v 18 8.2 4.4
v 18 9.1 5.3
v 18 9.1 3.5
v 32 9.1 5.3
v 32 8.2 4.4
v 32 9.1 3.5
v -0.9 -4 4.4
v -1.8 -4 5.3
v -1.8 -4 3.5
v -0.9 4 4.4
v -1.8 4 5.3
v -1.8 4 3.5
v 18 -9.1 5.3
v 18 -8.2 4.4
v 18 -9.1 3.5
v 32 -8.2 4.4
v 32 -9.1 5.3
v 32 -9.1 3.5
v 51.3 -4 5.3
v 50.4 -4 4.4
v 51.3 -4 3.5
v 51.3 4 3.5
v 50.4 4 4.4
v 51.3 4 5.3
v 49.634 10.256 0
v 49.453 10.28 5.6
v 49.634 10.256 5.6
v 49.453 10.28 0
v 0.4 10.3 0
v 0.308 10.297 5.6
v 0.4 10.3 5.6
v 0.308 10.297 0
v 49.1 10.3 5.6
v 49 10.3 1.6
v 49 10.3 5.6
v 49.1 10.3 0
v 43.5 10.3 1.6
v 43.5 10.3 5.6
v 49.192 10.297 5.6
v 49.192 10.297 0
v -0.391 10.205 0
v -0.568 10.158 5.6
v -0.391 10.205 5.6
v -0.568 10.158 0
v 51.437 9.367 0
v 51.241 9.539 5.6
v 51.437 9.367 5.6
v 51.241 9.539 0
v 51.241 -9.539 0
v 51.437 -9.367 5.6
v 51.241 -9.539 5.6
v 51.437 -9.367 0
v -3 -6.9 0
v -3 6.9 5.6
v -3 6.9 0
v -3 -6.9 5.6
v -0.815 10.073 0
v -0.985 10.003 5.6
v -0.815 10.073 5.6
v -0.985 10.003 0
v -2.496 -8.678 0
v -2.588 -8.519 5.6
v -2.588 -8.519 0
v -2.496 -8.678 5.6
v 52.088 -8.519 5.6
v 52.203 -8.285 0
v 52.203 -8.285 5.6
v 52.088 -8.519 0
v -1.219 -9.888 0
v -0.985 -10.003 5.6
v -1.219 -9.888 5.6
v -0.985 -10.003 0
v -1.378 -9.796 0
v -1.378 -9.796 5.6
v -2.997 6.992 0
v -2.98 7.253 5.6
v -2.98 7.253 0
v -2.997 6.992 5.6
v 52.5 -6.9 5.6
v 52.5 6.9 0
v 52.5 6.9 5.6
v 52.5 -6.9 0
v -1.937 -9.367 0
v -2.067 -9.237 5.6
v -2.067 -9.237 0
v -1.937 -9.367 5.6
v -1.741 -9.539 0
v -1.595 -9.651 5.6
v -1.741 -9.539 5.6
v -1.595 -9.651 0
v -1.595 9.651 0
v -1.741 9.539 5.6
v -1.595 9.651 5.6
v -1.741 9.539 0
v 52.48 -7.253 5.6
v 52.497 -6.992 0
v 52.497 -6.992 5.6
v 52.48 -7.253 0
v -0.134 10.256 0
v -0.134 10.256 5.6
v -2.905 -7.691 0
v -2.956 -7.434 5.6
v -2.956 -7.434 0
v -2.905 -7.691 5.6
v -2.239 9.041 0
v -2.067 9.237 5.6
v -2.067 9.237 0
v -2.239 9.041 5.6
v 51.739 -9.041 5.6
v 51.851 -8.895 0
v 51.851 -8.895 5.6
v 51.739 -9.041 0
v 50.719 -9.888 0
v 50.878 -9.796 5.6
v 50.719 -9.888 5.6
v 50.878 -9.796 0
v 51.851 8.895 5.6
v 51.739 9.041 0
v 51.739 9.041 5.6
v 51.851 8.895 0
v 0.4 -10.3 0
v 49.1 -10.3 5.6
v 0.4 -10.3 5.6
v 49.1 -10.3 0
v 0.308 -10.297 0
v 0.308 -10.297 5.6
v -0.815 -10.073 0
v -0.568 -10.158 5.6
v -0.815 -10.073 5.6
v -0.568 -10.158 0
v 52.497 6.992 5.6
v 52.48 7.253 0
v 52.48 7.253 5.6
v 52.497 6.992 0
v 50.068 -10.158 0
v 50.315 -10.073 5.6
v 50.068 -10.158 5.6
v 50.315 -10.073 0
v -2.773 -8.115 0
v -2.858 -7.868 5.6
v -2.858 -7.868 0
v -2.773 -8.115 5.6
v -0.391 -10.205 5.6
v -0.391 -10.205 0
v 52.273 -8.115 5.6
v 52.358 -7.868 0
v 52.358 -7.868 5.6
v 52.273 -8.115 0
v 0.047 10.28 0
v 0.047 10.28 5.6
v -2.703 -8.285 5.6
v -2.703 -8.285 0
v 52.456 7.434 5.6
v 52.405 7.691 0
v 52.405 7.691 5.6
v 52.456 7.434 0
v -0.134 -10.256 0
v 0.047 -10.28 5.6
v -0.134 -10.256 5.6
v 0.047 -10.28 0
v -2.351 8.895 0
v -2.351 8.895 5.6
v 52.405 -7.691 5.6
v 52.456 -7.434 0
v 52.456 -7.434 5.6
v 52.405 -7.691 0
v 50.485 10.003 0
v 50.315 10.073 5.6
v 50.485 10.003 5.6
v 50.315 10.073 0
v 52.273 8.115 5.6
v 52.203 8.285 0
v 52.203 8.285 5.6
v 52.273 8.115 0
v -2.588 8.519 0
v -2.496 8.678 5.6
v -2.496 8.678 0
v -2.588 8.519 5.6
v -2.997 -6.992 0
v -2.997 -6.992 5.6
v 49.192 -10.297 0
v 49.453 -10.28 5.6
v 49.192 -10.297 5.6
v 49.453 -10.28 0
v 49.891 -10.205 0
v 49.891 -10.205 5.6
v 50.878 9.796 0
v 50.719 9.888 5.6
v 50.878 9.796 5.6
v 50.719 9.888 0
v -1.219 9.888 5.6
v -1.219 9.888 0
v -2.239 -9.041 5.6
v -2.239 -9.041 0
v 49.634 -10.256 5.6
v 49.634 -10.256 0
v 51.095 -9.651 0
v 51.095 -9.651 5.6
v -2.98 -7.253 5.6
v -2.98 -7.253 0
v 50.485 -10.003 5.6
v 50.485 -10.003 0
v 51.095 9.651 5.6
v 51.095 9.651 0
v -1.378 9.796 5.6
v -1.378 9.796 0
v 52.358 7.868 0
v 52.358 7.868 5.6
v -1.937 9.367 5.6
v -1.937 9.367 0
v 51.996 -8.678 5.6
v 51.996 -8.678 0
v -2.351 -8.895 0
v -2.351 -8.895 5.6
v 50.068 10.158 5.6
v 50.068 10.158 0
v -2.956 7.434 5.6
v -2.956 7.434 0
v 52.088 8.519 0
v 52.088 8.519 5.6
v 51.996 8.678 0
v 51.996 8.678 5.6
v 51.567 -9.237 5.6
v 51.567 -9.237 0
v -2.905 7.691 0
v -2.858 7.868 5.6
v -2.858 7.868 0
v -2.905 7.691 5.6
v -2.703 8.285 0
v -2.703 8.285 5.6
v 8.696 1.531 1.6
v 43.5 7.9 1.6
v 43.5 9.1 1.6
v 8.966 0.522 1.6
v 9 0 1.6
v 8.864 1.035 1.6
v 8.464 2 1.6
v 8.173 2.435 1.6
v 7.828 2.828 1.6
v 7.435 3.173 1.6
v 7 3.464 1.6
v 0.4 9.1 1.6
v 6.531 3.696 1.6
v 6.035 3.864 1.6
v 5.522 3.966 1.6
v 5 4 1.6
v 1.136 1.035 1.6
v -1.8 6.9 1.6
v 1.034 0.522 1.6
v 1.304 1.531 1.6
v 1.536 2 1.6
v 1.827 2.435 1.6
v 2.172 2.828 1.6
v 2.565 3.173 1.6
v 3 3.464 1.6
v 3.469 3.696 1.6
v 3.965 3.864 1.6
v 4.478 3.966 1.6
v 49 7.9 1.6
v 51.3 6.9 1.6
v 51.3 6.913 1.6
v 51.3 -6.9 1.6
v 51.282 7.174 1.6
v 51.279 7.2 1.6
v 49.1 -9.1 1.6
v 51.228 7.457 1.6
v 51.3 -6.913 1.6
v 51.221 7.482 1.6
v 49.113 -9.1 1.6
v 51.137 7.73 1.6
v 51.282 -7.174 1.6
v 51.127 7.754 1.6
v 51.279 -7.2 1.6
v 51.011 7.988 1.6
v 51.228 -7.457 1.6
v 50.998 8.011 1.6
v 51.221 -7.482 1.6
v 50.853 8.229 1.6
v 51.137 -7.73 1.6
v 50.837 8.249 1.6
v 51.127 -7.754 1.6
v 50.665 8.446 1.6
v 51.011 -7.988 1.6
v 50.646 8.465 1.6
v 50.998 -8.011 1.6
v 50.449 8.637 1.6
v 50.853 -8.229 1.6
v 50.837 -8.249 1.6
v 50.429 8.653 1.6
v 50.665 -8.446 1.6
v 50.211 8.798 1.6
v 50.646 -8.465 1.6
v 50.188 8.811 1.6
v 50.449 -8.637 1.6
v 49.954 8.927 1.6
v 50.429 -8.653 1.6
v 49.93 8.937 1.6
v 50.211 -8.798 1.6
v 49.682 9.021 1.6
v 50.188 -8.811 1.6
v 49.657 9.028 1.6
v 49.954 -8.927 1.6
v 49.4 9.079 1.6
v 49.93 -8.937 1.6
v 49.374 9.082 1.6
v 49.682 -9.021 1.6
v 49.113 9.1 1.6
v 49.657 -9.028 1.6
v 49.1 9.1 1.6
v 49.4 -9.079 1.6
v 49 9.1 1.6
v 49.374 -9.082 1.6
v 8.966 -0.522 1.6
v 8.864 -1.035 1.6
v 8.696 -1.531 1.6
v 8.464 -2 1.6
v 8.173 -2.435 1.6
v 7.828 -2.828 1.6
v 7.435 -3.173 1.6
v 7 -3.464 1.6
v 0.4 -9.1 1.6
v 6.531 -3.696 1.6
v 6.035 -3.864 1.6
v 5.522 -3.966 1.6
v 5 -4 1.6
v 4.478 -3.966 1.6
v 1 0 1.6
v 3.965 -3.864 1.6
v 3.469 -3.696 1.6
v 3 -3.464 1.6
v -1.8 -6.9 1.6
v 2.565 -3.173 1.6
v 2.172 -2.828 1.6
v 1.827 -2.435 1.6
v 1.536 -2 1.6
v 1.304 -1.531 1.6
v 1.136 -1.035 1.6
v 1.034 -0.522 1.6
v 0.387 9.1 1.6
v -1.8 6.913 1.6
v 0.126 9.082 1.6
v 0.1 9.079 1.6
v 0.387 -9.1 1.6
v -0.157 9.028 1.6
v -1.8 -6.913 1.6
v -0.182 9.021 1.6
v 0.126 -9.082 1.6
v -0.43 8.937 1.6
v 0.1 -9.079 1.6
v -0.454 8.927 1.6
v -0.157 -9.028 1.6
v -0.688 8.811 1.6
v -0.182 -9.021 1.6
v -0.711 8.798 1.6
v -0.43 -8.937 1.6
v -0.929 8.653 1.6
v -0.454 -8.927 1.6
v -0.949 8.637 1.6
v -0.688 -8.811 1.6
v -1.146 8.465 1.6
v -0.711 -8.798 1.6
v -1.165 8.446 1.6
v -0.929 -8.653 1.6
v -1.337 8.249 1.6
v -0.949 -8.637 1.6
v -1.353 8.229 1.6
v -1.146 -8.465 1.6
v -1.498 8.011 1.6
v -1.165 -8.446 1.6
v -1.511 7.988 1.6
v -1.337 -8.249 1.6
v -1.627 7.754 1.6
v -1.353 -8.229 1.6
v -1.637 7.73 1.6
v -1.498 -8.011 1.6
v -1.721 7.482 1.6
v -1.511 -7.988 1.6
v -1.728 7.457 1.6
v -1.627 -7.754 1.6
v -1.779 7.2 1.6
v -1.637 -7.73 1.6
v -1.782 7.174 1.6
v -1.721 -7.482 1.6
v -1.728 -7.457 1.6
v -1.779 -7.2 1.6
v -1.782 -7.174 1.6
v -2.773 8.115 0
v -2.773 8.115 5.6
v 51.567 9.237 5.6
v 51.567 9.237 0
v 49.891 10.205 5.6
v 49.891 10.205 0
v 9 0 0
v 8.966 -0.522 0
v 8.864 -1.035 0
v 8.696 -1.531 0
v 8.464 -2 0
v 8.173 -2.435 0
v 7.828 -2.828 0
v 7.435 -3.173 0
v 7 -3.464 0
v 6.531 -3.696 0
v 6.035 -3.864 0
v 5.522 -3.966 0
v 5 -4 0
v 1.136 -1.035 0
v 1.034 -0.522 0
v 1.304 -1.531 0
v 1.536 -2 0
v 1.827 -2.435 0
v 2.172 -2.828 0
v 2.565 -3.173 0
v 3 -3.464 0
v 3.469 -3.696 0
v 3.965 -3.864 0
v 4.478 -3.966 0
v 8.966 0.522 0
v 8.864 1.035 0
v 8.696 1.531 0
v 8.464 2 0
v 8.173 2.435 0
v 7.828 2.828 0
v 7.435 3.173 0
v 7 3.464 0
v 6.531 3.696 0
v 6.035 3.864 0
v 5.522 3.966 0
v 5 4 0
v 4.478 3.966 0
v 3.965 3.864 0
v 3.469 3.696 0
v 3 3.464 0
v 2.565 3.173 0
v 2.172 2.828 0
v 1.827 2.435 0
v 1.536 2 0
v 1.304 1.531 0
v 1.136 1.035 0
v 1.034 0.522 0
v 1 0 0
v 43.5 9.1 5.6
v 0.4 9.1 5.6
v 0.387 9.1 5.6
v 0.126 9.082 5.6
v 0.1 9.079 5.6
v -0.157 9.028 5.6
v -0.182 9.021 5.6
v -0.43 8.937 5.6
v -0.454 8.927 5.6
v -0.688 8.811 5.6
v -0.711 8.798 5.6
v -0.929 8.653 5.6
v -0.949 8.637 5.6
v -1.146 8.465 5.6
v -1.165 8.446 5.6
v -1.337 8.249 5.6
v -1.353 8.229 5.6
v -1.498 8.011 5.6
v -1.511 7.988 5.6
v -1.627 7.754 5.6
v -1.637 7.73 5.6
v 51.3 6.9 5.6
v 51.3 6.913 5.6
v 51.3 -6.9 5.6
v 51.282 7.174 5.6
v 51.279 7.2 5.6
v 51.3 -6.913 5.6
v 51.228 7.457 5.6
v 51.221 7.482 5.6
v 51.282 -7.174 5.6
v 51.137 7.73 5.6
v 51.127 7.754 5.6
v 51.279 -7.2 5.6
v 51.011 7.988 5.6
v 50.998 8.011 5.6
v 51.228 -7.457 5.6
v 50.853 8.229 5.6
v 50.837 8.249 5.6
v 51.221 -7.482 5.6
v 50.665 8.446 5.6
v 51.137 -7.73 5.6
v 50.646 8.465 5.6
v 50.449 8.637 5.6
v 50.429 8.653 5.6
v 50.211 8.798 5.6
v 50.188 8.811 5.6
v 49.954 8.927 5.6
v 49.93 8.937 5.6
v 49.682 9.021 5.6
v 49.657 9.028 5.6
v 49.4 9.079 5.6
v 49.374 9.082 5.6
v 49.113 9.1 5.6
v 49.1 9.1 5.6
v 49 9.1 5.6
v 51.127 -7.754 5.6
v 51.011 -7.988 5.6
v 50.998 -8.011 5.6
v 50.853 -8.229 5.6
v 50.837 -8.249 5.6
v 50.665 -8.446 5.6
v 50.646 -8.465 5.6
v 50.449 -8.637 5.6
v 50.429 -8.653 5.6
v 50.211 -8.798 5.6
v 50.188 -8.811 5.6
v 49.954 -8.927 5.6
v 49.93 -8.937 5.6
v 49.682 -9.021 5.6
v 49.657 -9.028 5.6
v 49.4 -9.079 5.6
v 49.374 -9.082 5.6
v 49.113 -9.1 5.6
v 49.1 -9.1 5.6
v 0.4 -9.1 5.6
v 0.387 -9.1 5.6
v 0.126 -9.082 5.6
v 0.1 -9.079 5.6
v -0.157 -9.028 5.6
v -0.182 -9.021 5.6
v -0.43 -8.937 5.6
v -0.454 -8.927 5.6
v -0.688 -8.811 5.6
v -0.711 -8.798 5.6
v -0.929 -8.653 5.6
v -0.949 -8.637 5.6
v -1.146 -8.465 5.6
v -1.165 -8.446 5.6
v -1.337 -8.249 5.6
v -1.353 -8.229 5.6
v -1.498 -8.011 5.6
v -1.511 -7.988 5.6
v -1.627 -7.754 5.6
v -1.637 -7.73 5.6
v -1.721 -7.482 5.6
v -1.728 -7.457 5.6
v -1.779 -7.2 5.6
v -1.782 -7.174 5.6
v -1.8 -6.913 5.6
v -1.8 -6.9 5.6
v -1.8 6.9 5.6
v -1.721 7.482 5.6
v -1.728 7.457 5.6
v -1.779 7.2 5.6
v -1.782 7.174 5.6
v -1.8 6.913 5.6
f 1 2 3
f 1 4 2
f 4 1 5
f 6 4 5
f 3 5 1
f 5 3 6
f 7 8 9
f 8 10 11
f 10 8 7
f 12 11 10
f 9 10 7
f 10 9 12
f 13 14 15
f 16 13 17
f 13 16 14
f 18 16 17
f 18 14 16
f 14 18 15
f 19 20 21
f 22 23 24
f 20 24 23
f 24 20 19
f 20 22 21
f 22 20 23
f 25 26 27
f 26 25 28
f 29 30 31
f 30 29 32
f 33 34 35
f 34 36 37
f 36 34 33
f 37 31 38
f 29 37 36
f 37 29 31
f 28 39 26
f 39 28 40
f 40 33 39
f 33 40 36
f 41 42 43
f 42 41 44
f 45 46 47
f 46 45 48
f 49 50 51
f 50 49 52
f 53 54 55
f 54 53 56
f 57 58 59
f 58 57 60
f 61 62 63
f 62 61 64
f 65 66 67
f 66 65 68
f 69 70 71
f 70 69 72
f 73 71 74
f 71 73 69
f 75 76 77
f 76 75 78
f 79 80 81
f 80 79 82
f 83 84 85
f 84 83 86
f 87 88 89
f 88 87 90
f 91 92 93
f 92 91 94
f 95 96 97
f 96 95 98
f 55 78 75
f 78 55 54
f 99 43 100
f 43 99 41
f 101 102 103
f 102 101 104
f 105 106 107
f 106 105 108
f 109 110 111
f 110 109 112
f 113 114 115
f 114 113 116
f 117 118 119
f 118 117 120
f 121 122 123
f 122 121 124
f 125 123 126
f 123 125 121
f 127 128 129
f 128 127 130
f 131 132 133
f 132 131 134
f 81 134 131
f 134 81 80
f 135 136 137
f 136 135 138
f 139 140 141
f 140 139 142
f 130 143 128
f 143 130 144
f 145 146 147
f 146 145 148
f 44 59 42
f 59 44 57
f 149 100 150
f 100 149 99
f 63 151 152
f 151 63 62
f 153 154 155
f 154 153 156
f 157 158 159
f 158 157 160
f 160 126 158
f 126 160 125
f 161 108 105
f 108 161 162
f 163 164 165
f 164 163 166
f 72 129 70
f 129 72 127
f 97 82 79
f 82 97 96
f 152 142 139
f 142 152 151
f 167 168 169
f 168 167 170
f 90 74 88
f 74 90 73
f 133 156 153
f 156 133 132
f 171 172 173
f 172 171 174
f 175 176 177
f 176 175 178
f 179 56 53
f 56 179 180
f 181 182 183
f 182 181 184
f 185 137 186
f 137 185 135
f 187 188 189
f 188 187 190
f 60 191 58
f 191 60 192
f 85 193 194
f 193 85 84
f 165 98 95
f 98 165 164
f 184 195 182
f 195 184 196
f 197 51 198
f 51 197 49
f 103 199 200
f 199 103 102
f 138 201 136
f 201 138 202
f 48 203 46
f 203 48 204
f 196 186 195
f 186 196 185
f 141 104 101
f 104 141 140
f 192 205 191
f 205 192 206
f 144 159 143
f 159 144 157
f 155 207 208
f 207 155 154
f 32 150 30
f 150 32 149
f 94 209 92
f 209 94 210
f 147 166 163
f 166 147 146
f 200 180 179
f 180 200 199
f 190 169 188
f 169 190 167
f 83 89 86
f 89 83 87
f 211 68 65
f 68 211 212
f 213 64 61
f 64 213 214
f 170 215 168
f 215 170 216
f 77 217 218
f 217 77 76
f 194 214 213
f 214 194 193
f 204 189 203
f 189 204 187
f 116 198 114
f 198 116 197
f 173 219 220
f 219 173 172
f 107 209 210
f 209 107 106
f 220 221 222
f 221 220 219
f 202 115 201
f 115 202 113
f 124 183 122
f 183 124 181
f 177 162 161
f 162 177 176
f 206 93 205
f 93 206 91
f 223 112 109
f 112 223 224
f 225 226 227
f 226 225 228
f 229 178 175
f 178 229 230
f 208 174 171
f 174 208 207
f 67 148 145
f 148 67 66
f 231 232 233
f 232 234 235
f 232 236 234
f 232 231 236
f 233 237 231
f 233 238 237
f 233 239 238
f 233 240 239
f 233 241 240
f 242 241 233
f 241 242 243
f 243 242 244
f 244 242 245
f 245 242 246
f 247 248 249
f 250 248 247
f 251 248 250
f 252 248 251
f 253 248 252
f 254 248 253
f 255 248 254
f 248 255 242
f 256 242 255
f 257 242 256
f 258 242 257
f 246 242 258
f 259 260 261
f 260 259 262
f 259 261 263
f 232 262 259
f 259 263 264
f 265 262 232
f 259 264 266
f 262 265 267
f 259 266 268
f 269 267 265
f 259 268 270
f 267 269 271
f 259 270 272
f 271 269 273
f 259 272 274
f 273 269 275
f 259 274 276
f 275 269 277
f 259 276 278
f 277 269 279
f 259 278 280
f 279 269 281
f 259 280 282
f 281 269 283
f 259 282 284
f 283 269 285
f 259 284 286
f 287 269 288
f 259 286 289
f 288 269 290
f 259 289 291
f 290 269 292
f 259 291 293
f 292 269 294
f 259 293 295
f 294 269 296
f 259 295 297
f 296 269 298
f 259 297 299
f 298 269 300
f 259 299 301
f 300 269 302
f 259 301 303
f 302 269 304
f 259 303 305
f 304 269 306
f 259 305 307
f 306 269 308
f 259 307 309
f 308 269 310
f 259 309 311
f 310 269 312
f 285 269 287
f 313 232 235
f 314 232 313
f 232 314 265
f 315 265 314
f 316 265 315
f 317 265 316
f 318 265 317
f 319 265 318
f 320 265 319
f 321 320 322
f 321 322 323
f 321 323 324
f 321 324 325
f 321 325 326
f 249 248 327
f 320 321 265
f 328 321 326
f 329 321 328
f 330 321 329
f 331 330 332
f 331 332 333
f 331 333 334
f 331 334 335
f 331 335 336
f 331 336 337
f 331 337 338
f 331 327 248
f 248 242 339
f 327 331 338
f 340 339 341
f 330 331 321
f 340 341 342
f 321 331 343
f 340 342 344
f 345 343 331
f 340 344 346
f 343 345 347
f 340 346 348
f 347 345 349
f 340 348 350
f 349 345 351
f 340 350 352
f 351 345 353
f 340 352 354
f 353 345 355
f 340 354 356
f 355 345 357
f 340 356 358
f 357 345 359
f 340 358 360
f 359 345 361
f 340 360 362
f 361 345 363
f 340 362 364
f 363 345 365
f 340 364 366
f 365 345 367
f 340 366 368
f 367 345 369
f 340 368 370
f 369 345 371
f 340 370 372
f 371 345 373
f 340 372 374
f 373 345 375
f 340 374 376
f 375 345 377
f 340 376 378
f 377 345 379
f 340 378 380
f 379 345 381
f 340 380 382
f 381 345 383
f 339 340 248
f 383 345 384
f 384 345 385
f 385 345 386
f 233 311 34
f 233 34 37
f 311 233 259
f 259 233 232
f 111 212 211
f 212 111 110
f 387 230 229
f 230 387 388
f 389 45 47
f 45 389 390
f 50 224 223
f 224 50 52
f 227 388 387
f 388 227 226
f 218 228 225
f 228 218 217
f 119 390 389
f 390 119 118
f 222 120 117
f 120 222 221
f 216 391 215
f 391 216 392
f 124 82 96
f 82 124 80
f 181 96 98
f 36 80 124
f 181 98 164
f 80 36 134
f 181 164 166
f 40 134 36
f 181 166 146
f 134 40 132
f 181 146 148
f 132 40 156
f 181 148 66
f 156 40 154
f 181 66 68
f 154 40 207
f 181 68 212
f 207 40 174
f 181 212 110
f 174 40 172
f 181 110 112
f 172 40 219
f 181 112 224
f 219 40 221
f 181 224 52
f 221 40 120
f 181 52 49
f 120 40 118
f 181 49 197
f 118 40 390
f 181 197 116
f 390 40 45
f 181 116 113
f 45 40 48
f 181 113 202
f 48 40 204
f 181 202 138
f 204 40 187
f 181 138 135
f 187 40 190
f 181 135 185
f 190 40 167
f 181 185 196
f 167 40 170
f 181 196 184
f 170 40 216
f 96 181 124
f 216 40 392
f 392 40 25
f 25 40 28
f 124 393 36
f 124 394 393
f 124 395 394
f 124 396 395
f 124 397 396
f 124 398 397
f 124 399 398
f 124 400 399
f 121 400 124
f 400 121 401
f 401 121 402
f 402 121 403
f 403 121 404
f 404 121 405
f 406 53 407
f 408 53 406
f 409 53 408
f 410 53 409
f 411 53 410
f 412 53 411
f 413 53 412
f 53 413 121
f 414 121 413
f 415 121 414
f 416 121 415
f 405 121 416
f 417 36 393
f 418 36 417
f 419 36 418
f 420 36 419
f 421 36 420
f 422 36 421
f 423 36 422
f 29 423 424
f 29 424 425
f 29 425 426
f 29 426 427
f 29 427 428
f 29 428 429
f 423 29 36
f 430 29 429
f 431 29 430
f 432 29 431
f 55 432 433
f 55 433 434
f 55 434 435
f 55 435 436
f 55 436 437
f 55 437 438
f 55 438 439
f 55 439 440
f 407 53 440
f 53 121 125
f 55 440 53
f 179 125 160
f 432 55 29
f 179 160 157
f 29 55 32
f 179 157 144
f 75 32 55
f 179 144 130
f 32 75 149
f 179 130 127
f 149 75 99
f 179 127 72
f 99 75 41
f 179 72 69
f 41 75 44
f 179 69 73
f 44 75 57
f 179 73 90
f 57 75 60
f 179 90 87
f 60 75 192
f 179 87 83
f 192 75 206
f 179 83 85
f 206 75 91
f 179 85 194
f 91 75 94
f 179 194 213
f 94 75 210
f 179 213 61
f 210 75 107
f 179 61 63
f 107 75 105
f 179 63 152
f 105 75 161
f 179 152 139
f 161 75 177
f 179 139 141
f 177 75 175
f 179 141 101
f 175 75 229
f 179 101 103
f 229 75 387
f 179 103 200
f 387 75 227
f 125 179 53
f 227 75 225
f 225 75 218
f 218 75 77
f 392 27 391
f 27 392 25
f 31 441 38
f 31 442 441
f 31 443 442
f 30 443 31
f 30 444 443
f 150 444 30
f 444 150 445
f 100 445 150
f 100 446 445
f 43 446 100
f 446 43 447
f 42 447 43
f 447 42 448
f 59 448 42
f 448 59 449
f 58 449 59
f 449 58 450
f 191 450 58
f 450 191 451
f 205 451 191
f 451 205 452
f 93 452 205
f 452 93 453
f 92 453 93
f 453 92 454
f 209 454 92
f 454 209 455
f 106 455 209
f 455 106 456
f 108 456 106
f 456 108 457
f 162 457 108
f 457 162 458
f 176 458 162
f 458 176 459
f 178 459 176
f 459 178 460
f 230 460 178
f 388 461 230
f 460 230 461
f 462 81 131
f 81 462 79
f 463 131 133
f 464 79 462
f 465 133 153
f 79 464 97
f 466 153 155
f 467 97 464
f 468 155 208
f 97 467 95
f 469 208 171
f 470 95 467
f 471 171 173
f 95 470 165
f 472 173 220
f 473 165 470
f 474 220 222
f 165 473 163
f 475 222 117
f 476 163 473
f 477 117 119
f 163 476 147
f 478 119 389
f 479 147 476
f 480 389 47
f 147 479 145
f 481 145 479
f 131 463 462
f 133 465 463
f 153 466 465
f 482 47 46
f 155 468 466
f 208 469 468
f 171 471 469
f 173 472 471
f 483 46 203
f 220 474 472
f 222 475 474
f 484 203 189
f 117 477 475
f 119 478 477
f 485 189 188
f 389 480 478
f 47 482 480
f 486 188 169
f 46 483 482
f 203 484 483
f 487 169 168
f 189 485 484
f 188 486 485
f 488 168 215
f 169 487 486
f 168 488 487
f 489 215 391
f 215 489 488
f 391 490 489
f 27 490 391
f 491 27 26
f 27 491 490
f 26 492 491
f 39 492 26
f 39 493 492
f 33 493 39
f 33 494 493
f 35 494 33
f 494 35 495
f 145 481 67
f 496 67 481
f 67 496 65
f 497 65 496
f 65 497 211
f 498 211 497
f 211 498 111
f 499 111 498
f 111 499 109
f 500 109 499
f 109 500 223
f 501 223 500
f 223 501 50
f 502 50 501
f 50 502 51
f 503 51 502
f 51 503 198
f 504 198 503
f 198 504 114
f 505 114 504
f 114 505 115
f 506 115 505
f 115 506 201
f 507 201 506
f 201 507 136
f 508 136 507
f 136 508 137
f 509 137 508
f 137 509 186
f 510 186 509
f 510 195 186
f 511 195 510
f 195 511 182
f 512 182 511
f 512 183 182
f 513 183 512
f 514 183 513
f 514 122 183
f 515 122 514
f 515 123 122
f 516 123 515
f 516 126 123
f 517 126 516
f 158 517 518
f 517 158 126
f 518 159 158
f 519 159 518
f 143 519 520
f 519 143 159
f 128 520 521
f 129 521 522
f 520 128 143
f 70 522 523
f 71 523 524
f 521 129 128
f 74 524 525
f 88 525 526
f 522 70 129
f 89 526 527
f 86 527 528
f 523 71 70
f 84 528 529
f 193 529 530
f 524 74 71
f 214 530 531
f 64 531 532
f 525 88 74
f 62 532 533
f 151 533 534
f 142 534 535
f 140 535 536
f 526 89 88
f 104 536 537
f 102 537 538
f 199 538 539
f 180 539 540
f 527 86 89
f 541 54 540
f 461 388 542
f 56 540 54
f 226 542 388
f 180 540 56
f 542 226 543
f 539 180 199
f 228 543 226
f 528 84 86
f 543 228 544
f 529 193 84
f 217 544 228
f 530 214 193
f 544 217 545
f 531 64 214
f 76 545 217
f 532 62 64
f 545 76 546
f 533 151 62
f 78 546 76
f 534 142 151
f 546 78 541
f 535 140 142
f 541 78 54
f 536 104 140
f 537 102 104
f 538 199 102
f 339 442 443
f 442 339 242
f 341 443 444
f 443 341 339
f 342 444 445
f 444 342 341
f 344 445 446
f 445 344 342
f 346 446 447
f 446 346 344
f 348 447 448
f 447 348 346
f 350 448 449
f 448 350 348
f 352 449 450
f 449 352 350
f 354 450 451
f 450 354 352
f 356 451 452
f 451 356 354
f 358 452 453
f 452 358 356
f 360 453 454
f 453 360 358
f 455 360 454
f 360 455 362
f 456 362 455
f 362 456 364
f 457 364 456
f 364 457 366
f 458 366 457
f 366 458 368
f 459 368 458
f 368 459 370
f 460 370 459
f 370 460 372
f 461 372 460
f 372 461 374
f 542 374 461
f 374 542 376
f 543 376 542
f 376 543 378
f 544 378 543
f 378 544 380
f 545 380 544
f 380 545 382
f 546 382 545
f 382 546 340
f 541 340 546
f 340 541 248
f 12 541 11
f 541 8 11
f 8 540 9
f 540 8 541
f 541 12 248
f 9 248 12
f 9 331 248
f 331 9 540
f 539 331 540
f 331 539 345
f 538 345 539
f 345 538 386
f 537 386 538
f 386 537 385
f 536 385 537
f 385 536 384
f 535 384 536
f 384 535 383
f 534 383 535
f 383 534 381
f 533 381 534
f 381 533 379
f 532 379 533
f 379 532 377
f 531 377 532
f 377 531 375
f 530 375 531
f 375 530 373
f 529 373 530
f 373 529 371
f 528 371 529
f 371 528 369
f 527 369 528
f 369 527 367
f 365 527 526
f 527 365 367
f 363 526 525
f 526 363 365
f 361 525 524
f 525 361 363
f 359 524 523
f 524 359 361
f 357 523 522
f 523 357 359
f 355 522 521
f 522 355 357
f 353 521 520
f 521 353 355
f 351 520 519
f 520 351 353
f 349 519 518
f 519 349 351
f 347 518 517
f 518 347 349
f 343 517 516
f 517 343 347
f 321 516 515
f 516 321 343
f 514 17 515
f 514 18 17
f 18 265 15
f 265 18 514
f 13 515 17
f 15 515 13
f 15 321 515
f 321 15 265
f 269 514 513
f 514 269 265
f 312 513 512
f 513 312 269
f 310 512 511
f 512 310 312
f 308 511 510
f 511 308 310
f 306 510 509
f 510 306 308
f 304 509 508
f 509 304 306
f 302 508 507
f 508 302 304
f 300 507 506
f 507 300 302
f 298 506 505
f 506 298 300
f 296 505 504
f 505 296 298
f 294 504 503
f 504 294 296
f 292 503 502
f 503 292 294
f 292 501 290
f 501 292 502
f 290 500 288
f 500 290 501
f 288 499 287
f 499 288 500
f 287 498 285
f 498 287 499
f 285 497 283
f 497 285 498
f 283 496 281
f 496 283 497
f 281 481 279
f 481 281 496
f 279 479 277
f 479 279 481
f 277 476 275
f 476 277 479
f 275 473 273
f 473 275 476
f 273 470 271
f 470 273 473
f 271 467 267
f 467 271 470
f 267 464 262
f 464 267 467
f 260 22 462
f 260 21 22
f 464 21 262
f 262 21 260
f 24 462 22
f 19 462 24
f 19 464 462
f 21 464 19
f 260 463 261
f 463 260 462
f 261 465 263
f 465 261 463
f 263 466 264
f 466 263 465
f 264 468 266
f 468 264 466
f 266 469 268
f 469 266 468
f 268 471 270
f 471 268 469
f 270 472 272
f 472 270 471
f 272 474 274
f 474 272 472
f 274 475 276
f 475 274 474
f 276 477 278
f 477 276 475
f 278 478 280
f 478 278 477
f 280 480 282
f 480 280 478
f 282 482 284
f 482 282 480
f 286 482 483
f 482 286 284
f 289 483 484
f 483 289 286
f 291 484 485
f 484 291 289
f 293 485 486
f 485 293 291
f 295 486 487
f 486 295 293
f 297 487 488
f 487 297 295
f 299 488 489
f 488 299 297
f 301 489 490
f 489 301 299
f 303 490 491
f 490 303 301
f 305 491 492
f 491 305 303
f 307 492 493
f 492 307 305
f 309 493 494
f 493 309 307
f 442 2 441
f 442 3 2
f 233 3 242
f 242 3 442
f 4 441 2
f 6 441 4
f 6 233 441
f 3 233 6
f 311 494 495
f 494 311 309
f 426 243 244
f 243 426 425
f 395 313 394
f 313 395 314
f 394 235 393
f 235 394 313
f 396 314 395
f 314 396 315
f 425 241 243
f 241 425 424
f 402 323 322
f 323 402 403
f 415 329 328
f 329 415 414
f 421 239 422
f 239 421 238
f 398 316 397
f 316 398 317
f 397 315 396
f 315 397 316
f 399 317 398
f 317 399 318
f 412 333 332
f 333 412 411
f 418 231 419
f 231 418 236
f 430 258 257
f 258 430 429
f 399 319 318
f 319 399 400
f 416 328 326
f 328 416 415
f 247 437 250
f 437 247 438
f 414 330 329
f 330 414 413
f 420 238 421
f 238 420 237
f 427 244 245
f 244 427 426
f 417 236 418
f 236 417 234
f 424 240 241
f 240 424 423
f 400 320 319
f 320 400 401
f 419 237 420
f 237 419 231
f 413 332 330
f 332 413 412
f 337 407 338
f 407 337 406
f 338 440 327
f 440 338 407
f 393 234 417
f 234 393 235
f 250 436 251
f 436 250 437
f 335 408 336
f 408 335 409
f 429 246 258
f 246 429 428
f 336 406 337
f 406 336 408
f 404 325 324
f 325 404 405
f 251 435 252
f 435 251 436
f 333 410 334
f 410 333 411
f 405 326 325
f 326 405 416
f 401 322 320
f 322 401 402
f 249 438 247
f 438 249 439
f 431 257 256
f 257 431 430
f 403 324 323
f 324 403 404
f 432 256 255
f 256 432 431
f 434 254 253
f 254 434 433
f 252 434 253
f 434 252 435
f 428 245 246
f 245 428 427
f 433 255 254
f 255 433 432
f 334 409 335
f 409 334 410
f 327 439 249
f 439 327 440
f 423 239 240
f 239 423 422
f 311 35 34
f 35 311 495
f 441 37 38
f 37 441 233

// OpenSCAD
// Snap cover for the potted shell, PETG, in print orientation: plate face down, skirt up.
// Use pose is cover() in model.scad; this turns it over about X (a rotation, not a mirror).
include <model.scad>
part = "none";

rotate([180, 0, 0]) translate([0, 0, -(shell_h + cover_t)]) cover();
